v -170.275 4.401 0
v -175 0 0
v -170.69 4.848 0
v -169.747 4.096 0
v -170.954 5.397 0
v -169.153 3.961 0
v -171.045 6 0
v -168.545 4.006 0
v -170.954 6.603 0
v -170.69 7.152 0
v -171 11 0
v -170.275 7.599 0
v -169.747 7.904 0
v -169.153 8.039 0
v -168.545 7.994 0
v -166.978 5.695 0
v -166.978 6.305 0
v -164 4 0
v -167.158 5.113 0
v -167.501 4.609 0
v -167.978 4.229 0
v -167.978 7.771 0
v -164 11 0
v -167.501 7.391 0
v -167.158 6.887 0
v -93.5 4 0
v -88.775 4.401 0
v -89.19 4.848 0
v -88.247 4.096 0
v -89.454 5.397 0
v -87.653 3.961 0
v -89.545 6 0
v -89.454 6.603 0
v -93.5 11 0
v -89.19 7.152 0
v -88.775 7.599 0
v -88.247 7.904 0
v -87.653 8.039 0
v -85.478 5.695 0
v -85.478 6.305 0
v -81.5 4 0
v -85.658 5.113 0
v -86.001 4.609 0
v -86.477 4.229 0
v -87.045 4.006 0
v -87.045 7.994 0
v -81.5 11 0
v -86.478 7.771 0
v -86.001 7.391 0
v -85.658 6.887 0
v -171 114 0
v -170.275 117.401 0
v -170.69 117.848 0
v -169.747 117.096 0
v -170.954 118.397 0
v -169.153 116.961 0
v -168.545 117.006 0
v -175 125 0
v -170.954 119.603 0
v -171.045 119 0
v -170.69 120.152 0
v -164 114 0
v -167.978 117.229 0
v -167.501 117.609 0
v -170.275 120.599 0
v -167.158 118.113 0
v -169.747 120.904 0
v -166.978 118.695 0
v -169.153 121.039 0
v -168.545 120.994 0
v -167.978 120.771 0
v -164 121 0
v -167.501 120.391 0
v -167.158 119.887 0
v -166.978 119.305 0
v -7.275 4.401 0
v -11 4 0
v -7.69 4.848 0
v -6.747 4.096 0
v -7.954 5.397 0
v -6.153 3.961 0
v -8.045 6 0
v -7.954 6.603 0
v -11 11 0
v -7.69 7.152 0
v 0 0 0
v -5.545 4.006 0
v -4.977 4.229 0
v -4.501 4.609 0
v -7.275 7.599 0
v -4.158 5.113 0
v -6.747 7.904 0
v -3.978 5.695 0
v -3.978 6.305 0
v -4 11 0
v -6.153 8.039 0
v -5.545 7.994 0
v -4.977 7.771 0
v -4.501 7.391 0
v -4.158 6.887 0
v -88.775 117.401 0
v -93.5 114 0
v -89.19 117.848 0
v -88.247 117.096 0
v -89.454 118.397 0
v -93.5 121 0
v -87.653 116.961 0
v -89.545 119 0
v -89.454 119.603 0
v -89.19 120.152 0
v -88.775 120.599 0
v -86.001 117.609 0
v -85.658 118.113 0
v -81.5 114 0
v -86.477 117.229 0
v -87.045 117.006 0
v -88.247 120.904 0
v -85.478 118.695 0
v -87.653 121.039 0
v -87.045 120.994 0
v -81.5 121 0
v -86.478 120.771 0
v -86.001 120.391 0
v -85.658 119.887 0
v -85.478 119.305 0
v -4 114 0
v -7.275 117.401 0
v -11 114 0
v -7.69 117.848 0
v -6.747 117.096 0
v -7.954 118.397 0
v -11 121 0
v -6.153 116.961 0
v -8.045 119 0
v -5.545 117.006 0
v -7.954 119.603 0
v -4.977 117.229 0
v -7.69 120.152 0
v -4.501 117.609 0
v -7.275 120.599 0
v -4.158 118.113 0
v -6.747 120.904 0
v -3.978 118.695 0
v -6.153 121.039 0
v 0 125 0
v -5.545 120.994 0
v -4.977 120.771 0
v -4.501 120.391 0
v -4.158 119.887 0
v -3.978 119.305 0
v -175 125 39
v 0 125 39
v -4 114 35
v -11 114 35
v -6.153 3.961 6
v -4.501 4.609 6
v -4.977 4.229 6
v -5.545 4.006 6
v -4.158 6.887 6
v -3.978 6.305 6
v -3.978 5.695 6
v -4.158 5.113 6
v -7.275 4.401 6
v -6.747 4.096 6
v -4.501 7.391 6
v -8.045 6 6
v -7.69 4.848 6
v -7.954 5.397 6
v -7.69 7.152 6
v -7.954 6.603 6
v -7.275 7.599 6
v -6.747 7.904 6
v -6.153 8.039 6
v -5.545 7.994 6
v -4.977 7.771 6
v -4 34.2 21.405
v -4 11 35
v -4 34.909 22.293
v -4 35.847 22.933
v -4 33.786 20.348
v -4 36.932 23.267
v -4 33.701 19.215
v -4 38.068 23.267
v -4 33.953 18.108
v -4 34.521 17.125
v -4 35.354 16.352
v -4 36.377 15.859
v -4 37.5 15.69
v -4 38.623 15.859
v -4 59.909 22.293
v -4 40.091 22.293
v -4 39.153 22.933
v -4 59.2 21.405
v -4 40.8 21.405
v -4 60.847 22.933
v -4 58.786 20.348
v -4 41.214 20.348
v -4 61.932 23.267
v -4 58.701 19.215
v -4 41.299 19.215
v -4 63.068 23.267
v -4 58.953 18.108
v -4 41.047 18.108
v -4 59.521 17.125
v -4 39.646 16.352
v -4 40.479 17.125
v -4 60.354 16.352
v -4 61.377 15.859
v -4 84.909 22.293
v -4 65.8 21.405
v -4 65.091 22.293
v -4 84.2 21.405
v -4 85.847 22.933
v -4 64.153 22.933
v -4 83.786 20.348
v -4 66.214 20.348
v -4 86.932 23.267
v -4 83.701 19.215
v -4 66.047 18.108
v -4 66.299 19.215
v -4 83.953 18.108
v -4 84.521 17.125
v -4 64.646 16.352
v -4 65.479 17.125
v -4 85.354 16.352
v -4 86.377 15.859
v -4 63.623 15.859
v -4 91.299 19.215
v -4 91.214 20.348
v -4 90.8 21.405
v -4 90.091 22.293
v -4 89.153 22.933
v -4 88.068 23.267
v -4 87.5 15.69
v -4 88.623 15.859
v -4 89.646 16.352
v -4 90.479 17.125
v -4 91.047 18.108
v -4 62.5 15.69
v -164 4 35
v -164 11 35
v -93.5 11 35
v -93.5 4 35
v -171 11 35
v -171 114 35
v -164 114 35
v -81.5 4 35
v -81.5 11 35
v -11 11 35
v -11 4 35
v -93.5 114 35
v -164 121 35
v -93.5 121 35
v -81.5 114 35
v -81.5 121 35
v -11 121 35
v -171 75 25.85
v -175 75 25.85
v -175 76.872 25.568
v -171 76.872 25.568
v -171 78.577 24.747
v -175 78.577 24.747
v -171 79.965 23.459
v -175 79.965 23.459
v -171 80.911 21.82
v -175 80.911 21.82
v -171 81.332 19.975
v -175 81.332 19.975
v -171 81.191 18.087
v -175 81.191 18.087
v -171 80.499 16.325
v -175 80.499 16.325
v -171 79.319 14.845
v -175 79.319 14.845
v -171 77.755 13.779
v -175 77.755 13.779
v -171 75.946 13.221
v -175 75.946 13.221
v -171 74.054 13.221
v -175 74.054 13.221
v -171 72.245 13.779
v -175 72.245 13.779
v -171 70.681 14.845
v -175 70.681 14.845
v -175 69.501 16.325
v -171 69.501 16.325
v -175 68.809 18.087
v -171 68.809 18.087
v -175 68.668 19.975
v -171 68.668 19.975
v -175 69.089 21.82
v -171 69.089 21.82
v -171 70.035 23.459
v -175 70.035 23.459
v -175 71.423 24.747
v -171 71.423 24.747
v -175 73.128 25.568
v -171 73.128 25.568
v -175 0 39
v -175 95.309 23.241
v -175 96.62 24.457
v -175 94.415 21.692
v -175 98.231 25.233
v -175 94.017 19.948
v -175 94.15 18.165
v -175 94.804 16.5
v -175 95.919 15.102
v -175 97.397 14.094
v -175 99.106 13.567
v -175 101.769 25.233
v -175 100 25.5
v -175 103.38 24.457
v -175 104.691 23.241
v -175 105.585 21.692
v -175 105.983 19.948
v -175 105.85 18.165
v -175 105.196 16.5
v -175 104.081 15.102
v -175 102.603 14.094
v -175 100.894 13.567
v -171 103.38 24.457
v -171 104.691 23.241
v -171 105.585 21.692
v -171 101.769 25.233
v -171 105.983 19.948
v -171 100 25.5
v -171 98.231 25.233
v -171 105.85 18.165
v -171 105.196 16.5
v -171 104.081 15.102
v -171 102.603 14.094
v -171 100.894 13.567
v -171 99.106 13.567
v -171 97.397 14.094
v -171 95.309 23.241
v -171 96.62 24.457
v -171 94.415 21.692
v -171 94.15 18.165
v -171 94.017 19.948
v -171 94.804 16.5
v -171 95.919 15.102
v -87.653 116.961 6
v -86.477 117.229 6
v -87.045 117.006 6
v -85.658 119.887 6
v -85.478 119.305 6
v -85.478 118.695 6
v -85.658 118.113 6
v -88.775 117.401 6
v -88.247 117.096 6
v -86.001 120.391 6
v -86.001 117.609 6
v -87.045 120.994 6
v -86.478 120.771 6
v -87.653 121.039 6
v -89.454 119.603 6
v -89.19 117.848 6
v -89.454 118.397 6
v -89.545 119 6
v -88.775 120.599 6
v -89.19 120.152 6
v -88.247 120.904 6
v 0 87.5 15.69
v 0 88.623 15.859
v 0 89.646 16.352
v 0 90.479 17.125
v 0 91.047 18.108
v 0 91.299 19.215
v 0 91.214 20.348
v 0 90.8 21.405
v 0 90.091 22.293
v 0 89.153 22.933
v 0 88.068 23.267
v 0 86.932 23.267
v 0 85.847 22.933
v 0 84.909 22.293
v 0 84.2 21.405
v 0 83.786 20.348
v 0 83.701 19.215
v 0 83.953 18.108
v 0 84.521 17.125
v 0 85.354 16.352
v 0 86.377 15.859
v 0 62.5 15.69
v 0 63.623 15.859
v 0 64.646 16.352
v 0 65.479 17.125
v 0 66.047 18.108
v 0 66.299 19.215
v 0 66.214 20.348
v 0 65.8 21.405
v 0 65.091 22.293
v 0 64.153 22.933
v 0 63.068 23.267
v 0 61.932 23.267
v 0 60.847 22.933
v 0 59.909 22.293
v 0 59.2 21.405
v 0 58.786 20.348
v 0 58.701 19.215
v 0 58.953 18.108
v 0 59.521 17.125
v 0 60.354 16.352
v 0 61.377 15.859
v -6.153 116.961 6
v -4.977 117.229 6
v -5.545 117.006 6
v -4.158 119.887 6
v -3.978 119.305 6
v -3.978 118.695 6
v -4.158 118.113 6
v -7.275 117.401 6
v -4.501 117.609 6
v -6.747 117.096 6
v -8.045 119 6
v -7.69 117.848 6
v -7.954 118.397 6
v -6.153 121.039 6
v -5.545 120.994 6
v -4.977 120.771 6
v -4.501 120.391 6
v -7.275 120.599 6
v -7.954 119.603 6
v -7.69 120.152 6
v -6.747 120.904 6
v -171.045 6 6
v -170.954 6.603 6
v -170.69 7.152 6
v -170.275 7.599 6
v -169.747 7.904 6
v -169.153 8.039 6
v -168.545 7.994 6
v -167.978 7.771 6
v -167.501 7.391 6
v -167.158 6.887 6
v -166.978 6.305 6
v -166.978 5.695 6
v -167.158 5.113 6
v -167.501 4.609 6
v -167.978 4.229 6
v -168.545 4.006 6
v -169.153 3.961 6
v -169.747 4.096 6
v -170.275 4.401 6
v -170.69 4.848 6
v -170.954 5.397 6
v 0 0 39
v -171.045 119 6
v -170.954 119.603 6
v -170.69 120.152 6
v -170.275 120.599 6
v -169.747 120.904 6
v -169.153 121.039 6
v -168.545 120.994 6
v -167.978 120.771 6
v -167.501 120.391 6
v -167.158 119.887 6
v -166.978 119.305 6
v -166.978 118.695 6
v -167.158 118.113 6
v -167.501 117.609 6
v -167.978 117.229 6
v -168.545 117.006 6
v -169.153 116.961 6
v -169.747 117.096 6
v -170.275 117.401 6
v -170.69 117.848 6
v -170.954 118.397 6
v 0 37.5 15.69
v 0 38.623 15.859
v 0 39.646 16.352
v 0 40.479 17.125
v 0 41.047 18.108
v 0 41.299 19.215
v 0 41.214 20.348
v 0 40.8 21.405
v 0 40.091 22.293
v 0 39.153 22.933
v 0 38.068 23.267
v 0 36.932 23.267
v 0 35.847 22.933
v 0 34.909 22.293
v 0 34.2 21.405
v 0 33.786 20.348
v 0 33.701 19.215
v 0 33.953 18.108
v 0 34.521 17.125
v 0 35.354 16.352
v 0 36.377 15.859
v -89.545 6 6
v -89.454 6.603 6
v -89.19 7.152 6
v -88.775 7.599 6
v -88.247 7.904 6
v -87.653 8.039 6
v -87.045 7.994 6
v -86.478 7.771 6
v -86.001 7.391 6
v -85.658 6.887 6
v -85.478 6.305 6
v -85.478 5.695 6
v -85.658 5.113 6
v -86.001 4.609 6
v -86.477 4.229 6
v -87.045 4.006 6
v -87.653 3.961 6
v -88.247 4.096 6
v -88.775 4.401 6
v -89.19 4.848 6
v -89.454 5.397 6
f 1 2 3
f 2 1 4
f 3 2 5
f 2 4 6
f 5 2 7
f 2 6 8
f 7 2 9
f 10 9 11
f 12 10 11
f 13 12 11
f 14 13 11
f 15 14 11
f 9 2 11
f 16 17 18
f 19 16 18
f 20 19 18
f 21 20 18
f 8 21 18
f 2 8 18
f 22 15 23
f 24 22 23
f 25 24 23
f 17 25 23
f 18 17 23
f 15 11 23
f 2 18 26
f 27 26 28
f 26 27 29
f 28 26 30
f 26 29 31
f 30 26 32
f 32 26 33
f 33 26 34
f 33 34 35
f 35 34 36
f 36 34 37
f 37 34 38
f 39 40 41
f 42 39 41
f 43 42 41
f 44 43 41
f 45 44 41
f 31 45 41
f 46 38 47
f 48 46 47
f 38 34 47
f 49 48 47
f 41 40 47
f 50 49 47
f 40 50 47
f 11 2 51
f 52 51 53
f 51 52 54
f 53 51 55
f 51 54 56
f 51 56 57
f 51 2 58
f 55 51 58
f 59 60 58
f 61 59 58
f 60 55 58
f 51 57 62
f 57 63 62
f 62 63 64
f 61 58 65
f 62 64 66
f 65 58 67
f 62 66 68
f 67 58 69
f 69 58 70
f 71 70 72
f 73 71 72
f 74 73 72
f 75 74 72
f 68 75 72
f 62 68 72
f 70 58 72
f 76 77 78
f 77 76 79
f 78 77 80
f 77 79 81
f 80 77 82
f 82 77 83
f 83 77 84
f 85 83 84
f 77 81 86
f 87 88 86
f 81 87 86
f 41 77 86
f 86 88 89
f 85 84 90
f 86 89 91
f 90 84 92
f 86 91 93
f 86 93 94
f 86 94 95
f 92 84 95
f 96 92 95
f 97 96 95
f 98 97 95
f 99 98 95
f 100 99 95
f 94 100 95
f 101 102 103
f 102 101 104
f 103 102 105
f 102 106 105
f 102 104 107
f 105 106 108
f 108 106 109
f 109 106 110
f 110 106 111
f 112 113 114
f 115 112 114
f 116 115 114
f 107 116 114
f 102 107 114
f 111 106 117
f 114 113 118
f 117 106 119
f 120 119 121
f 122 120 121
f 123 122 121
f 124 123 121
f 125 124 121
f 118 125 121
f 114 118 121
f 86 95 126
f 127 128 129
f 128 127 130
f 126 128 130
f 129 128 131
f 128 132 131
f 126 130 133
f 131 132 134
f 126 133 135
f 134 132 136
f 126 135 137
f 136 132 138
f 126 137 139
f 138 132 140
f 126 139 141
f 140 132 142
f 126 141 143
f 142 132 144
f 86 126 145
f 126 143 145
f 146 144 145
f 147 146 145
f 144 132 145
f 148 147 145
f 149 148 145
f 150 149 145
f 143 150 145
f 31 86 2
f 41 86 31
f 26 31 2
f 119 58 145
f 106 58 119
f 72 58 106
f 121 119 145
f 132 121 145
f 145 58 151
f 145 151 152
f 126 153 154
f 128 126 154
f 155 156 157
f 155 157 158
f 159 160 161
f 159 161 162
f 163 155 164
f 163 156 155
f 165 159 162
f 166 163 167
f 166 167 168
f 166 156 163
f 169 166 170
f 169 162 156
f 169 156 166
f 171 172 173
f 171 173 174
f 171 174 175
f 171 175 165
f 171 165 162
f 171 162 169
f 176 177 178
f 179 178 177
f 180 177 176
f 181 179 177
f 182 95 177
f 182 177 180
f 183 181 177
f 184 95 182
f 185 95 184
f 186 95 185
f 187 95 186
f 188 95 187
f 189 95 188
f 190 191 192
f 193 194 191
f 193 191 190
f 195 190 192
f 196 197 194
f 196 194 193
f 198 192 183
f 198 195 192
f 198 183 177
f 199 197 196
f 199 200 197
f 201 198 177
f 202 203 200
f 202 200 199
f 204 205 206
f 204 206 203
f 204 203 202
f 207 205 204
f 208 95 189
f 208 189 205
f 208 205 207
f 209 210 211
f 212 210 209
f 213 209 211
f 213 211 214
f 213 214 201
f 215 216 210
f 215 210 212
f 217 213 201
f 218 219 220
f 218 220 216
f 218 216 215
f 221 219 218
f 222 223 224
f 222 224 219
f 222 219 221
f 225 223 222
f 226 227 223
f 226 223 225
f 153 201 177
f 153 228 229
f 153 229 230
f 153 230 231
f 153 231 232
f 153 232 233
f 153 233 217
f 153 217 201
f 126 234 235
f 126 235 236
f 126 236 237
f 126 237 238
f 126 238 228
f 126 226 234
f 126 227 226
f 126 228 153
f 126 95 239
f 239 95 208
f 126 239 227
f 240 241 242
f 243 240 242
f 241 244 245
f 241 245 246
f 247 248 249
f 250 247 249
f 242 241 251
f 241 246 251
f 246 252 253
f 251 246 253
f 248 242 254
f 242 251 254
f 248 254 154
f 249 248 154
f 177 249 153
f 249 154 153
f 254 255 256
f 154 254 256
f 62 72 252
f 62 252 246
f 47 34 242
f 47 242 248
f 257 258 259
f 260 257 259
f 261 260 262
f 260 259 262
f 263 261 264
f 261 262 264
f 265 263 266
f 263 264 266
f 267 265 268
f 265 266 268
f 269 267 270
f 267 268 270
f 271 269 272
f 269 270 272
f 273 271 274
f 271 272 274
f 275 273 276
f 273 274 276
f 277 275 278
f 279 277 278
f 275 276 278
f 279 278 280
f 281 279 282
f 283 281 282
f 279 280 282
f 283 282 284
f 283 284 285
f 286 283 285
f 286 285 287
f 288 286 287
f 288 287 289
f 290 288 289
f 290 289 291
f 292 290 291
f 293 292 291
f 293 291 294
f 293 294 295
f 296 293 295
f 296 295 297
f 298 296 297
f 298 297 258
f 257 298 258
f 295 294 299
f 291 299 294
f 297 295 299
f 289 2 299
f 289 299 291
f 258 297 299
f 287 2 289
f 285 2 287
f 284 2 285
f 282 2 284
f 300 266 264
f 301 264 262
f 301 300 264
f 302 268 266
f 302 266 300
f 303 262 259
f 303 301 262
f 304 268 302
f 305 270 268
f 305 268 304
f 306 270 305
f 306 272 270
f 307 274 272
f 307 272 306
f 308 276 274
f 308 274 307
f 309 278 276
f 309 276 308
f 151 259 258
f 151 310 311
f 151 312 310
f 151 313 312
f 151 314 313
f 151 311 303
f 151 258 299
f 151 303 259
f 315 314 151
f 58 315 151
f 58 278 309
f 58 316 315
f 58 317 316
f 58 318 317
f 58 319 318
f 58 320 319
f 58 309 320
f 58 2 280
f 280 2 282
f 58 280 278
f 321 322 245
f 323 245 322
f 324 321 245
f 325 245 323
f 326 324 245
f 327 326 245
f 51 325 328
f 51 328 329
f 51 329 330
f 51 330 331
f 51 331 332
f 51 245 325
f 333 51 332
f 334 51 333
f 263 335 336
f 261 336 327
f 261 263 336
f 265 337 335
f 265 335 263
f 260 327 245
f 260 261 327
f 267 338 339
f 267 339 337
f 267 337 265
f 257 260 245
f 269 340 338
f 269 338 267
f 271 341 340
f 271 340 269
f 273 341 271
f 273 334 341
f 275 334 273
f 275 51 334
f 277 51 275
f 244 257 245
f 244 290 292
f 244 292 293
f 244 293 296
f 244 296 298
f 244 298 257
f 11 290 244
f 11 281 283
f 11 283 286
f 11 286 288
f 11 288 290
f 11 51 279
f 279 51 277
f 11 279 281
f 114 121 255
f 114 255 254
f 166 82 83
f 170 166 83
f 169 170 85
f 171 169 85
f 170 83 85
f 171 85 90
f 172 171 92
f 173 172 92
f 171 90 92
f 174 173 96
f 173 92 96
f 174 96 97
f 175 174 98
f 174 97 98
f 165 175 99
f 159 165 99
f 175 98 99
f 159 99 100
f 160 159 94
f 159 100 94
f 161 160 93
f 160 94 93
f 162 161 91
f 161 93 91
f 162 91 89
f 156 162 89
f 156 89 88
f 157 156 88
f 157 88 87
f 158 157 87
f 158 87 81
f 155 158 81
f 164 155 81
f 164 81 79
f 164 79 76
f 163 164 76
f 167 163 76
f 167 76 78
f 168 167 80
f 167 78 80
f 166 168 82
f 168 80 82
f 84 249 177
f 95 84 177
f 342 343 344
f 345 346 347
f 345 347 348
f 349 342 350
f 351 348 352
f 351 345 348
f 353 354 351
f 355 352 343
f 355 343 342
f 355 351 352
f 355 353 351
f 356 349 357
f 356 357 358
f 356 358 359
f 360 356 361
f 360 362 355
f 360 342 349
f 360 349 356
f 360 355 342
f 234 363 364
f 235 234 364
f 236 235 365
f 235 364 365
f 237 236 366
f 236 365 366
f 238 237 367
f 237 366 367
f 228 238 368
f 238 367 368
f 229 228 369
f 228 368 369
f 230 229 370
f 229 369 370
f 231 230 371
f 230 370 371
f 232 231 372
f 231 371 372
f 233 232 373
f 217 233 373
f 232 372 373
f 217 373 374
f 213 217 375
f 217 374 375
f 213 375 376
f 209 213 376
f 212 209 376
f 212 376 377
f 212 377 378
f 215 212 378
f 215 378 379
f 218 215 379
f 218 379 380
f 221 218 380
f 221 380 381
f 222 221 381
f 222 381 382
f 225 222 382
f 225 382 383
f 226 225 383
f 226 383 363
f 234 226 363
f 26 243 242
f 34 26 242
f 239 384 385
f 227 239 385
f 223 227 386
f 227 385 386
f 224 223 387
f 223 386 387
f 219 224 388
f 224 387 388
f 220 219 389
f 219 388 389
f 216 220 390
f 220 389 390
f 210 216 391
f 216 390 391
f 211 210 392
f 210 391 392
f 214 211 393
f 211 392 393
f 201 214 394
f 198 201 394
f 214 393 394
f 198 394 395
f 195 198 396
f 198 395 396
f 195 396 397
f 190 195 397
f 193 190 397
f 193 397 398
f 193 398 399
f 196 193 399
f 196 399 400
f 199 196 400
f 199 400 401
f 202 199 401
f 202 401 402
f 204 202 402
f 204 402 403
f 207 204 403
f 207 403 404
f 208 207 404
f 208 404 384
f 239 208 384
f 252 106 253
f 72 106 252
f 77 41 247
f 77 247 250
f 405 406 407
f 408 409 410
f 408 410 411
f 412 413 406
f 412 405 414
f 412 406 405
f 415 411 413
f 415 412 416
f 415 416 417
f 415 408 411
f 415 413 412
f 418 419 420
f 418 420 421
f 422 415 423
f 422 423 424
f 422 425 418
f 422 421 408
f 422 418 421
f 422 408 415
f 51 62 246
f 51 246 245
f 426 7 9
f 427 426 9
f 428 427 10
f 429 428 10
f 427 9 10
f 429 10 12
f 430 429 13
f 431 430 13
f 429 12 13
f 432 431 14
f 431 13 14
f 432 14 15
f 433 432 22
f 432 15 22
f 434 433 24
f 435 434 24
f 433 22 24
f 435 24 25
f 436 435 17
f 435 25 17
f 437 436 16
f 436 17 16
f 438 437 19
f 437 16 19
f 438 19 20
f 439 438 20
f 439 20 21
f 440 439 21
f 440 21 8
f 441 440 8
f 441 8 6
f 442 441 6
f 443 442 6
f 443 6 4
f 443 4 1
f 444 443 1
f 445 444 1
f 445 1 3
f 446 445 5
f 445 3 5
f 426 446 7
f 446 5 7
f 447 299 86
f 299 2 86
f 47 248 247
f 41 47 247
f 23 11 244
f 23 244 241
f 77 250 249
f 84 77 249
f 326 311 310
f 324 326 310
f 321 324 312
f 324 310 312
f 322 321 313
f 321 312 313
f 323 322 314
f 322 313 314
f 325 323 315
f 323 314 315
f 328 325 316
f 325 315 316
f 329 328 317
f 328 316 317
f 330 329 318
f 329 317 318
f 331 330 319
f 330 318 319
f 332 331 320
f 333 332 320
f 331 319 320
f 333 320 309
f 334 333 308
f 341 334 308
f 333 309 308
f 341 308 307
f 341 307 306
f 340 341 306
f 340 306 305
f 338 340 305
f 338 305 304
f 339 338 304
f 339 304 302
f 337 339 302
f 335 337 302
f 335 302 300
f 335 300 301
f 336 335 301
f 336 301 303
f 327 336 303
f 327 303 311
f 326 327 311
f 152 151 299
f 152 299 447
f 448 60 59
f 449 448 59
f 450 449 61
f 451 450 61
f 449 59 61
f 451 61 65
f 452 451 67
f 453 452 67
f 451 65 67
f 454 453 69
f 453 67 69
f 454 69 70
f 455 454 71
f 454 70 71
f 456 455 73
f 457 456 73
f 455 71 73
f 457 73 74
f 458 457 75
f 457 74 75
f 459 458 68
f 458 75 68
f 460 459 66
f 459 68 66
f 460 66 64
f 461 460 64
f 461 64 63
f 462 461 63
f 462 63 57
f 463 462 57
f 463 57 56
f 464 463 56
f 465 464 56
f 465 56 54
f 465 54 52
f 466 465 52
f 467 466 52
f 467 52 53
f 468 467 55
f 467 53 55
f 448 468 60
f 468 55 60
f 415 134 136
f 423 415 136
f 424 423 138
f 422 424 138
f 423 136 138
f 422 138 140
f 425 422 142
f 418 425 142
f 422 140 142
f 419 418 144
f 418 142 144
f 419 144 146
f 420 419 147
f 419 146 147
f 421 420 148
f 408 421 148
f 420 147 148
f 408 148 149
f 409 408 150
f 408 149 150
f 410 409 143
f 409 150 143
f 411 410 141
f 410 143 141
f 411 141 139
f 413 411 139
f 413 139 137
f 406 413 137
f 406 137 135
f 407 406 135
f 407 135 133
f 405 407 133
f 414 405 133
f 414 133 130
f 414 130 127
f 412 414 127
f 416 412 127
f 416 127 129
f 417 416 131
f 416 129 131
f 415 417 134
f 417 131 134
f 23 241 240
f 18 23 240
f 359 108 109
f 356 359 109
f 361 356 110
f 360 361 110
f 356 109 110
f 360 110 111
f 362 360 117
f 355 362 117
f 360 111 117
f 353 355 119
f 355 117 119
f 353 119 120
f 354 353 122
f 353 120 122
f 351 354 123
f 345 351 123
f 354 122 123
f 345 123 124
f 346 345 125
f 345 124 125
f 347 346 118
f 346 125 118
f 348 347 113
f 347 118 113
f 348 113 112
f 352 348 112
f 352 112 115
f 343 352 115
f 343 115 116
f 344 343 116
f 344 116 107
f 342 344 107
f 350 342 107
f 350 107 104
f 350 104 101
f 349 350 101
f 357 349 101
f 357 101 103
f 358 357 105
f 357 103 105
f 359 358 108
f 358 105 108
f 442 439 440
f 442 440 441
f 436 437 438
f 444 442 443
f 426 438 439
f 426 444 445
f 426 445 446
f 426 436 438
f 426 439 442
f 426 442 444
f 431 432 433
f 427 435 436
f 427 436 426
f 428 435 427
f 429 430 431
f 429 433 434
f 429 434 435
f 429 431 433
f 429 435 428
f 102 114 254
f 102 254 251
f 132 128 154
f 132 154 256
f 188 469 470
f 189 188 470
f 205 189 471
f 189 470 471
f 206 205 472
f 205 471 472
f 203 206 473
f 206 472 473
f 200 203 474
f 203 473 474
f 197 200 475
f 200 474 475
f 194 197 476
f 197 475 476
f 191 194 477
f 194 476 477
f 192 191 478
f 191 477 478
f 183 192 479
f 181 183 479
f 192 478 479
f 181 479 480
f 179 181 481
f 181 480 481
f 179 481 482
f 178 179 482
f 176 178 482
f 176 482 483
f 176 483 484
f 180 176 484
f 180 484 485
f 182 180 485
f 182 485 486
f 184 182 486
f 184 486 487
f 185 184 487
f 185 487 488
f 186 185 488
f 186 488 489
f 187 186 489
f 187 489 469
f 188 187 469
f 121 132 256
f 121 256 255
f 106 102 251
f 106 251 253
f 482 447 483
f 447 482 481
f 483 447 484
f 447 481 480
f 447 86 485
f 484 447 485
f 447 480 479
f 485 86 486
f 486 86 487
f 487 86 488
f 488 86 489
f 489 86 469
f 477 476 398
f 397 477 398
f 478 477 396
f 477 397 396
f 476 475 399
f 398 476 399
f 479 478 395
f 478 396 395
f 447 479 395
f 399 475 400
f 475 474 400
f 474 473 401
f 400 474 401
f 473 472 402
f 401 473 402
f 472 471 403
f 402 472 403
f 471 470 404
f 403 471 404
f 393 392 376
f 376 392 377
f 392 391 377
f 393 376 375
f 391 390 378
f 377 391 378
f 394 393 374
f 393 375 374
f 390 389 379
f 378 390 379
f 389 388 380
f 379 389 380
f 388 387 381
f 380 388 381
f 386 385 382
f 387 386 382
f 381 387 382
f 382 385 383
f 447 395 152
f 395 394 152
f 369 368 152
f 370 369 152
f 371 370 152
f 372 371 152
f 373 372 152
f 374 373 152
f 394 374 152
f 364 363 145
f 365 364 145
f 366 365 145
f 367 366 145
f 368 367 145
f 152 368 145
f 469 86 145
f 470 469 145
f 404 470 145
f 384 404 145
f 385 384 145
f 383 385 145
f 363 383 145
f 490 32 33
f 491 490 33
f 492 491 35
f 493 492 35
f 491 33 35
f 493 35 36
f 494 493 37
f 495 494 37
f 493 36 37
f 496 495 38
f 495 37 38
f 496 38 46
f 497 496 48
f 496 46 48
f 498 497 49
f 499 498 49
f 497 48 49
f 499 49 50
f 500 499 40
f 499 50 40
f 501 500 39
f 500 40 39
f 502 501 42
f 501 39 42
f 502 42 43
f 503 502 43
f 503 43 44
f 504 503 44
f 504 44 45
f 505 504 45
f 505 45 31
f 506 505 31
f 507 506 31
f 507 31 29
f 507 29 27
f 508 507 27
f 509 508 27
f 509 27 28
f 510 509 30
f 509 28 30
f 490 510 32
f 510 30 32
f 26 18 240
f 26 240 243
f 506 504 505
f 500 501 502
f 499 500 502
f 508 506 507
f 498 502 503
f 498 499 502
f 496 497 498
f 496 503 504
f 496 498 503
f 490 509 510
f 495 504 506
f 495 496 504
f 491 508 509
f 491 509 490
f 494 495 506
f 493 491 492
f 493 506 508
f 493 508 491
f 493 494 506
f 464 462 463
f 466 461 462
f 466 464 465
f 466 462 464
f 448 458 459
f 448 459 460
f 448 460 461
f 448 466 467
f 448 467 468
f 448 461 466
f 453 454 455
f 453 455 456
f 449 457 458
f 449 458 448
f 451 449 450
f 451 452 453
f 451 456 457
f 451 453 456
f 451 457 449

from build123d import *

# Parameters (mm, degrees)
SKETCH1_W           = 175
SKETCH1_H           = 125
BOSS_EXTRUDE1_DEPTH = 35
SKETCH2_W           = 175
SKETCH2_H           = 125
BOSS_EXTRUDE2_DEPTH = 4
SKETCH3_R           = 2.045
CUT_EXTRUDE1_DEPTH  = 6
SKETCH4_R           = 3.81
CUT_EXTRUDE2_DEPTH  = 10
SKETCH5_R           = 6
SKETCH5_R_2         = 6.35
CUT_EXTRUDE3_DEPTH  = 10


with BuildPart() as part:
    # Sketch1 → Boss-Extrude1 (new body)
    with BuildSketch(Plane.XY):
        with Locations((-87.5, 62.5)):
            Rectangle(SKETCH1_W, SKETCH1_H)
        Polygon((-93.5, 121), (-164, 121), (-164, 114), (-171, 114), (-171, 11), (-164, 11), (-164, 4), (-93.5, 4), (-93.5, 11), (-81.5, 11), (-81.5, 4), (-11, 4), (-11, 11), (-4, 11), (-4, 114), (-11, 114), (-11, 121), (-81.5, 121), (-81.5, 114), (-93.5, 114), align=None, mode=Mode.SUBTRACT)
    extrude(amount=BOSS_EXTRUDE1_DEPTH)

    # Sketch2 → Boss-Extrude2 (add)
    with BuildSketch(Plane.XY.offset(35)):
        with Locations((-87.5, 62.5)):
            Rectangle(SKETCH2_W, SKETCH2_H)
    extrude(amount=BOSS_EXTRUDE2_DEPTH)

    # Sketch3 → Cut-Extrude1 (cut)
    with BuildSketch(Plane(origin=(0, 0, 0), x_dir=(-1, 0, 0), z_dir=(0, 0, -1))):
        with Locations((6, 119)):
            Circle(SKETCH3_R)
        with Locations((87.5, 119)):
            Circle(SKETCH3_R)
        with Locations((169, 119)):
            Circle(SKETCH3_R)
        with Locations((169, 6)):
            Circle(SKETCH3_R)
        with Locations((87.5, 6)):
            Circle(SKETCH3_R)
        with Locations((6, 6)):
            Circle(SKETCH3_R)
    extrude(amount=-CUT_EXTRUDE1_DEPTH, mode=Mode.SUBTRACT)

    # Sketch4 → Cut-Extrude2 (cut)
    with BuildSketch(Plane(origin=(0, 0, 0), x_dir=(0, 0, -1), z_dir=(1, 0, 0))):
        with Locations((-19.5, 87.5)):
            Circle(SKETCH4_R)
        with Locations((-19.5, 62.5)):
            Circle(SKETCH4_R)
        with Locations((-19.5, 37.5)):
            Circle(SKETCH4_R)
    extrude(amount=-CUT_EXTRUDE2_DEPTH, mode=Mode.SUBTRACT)

    # Sketch5 → Cut-Extrude3 (cut)
    with BuildSketch(Plane.ZY.offset(175)):
        with Locations((19.5, 100)):
            Circle(SKETCH5_R)
        with Locations((19.5, 75)):
            Circle(SKETCH5_R_2)
    extrude(amount=-CUT_EXTRUDE3_DEPTH, mode=Mode.SUBTRACT)


solid = part.part
